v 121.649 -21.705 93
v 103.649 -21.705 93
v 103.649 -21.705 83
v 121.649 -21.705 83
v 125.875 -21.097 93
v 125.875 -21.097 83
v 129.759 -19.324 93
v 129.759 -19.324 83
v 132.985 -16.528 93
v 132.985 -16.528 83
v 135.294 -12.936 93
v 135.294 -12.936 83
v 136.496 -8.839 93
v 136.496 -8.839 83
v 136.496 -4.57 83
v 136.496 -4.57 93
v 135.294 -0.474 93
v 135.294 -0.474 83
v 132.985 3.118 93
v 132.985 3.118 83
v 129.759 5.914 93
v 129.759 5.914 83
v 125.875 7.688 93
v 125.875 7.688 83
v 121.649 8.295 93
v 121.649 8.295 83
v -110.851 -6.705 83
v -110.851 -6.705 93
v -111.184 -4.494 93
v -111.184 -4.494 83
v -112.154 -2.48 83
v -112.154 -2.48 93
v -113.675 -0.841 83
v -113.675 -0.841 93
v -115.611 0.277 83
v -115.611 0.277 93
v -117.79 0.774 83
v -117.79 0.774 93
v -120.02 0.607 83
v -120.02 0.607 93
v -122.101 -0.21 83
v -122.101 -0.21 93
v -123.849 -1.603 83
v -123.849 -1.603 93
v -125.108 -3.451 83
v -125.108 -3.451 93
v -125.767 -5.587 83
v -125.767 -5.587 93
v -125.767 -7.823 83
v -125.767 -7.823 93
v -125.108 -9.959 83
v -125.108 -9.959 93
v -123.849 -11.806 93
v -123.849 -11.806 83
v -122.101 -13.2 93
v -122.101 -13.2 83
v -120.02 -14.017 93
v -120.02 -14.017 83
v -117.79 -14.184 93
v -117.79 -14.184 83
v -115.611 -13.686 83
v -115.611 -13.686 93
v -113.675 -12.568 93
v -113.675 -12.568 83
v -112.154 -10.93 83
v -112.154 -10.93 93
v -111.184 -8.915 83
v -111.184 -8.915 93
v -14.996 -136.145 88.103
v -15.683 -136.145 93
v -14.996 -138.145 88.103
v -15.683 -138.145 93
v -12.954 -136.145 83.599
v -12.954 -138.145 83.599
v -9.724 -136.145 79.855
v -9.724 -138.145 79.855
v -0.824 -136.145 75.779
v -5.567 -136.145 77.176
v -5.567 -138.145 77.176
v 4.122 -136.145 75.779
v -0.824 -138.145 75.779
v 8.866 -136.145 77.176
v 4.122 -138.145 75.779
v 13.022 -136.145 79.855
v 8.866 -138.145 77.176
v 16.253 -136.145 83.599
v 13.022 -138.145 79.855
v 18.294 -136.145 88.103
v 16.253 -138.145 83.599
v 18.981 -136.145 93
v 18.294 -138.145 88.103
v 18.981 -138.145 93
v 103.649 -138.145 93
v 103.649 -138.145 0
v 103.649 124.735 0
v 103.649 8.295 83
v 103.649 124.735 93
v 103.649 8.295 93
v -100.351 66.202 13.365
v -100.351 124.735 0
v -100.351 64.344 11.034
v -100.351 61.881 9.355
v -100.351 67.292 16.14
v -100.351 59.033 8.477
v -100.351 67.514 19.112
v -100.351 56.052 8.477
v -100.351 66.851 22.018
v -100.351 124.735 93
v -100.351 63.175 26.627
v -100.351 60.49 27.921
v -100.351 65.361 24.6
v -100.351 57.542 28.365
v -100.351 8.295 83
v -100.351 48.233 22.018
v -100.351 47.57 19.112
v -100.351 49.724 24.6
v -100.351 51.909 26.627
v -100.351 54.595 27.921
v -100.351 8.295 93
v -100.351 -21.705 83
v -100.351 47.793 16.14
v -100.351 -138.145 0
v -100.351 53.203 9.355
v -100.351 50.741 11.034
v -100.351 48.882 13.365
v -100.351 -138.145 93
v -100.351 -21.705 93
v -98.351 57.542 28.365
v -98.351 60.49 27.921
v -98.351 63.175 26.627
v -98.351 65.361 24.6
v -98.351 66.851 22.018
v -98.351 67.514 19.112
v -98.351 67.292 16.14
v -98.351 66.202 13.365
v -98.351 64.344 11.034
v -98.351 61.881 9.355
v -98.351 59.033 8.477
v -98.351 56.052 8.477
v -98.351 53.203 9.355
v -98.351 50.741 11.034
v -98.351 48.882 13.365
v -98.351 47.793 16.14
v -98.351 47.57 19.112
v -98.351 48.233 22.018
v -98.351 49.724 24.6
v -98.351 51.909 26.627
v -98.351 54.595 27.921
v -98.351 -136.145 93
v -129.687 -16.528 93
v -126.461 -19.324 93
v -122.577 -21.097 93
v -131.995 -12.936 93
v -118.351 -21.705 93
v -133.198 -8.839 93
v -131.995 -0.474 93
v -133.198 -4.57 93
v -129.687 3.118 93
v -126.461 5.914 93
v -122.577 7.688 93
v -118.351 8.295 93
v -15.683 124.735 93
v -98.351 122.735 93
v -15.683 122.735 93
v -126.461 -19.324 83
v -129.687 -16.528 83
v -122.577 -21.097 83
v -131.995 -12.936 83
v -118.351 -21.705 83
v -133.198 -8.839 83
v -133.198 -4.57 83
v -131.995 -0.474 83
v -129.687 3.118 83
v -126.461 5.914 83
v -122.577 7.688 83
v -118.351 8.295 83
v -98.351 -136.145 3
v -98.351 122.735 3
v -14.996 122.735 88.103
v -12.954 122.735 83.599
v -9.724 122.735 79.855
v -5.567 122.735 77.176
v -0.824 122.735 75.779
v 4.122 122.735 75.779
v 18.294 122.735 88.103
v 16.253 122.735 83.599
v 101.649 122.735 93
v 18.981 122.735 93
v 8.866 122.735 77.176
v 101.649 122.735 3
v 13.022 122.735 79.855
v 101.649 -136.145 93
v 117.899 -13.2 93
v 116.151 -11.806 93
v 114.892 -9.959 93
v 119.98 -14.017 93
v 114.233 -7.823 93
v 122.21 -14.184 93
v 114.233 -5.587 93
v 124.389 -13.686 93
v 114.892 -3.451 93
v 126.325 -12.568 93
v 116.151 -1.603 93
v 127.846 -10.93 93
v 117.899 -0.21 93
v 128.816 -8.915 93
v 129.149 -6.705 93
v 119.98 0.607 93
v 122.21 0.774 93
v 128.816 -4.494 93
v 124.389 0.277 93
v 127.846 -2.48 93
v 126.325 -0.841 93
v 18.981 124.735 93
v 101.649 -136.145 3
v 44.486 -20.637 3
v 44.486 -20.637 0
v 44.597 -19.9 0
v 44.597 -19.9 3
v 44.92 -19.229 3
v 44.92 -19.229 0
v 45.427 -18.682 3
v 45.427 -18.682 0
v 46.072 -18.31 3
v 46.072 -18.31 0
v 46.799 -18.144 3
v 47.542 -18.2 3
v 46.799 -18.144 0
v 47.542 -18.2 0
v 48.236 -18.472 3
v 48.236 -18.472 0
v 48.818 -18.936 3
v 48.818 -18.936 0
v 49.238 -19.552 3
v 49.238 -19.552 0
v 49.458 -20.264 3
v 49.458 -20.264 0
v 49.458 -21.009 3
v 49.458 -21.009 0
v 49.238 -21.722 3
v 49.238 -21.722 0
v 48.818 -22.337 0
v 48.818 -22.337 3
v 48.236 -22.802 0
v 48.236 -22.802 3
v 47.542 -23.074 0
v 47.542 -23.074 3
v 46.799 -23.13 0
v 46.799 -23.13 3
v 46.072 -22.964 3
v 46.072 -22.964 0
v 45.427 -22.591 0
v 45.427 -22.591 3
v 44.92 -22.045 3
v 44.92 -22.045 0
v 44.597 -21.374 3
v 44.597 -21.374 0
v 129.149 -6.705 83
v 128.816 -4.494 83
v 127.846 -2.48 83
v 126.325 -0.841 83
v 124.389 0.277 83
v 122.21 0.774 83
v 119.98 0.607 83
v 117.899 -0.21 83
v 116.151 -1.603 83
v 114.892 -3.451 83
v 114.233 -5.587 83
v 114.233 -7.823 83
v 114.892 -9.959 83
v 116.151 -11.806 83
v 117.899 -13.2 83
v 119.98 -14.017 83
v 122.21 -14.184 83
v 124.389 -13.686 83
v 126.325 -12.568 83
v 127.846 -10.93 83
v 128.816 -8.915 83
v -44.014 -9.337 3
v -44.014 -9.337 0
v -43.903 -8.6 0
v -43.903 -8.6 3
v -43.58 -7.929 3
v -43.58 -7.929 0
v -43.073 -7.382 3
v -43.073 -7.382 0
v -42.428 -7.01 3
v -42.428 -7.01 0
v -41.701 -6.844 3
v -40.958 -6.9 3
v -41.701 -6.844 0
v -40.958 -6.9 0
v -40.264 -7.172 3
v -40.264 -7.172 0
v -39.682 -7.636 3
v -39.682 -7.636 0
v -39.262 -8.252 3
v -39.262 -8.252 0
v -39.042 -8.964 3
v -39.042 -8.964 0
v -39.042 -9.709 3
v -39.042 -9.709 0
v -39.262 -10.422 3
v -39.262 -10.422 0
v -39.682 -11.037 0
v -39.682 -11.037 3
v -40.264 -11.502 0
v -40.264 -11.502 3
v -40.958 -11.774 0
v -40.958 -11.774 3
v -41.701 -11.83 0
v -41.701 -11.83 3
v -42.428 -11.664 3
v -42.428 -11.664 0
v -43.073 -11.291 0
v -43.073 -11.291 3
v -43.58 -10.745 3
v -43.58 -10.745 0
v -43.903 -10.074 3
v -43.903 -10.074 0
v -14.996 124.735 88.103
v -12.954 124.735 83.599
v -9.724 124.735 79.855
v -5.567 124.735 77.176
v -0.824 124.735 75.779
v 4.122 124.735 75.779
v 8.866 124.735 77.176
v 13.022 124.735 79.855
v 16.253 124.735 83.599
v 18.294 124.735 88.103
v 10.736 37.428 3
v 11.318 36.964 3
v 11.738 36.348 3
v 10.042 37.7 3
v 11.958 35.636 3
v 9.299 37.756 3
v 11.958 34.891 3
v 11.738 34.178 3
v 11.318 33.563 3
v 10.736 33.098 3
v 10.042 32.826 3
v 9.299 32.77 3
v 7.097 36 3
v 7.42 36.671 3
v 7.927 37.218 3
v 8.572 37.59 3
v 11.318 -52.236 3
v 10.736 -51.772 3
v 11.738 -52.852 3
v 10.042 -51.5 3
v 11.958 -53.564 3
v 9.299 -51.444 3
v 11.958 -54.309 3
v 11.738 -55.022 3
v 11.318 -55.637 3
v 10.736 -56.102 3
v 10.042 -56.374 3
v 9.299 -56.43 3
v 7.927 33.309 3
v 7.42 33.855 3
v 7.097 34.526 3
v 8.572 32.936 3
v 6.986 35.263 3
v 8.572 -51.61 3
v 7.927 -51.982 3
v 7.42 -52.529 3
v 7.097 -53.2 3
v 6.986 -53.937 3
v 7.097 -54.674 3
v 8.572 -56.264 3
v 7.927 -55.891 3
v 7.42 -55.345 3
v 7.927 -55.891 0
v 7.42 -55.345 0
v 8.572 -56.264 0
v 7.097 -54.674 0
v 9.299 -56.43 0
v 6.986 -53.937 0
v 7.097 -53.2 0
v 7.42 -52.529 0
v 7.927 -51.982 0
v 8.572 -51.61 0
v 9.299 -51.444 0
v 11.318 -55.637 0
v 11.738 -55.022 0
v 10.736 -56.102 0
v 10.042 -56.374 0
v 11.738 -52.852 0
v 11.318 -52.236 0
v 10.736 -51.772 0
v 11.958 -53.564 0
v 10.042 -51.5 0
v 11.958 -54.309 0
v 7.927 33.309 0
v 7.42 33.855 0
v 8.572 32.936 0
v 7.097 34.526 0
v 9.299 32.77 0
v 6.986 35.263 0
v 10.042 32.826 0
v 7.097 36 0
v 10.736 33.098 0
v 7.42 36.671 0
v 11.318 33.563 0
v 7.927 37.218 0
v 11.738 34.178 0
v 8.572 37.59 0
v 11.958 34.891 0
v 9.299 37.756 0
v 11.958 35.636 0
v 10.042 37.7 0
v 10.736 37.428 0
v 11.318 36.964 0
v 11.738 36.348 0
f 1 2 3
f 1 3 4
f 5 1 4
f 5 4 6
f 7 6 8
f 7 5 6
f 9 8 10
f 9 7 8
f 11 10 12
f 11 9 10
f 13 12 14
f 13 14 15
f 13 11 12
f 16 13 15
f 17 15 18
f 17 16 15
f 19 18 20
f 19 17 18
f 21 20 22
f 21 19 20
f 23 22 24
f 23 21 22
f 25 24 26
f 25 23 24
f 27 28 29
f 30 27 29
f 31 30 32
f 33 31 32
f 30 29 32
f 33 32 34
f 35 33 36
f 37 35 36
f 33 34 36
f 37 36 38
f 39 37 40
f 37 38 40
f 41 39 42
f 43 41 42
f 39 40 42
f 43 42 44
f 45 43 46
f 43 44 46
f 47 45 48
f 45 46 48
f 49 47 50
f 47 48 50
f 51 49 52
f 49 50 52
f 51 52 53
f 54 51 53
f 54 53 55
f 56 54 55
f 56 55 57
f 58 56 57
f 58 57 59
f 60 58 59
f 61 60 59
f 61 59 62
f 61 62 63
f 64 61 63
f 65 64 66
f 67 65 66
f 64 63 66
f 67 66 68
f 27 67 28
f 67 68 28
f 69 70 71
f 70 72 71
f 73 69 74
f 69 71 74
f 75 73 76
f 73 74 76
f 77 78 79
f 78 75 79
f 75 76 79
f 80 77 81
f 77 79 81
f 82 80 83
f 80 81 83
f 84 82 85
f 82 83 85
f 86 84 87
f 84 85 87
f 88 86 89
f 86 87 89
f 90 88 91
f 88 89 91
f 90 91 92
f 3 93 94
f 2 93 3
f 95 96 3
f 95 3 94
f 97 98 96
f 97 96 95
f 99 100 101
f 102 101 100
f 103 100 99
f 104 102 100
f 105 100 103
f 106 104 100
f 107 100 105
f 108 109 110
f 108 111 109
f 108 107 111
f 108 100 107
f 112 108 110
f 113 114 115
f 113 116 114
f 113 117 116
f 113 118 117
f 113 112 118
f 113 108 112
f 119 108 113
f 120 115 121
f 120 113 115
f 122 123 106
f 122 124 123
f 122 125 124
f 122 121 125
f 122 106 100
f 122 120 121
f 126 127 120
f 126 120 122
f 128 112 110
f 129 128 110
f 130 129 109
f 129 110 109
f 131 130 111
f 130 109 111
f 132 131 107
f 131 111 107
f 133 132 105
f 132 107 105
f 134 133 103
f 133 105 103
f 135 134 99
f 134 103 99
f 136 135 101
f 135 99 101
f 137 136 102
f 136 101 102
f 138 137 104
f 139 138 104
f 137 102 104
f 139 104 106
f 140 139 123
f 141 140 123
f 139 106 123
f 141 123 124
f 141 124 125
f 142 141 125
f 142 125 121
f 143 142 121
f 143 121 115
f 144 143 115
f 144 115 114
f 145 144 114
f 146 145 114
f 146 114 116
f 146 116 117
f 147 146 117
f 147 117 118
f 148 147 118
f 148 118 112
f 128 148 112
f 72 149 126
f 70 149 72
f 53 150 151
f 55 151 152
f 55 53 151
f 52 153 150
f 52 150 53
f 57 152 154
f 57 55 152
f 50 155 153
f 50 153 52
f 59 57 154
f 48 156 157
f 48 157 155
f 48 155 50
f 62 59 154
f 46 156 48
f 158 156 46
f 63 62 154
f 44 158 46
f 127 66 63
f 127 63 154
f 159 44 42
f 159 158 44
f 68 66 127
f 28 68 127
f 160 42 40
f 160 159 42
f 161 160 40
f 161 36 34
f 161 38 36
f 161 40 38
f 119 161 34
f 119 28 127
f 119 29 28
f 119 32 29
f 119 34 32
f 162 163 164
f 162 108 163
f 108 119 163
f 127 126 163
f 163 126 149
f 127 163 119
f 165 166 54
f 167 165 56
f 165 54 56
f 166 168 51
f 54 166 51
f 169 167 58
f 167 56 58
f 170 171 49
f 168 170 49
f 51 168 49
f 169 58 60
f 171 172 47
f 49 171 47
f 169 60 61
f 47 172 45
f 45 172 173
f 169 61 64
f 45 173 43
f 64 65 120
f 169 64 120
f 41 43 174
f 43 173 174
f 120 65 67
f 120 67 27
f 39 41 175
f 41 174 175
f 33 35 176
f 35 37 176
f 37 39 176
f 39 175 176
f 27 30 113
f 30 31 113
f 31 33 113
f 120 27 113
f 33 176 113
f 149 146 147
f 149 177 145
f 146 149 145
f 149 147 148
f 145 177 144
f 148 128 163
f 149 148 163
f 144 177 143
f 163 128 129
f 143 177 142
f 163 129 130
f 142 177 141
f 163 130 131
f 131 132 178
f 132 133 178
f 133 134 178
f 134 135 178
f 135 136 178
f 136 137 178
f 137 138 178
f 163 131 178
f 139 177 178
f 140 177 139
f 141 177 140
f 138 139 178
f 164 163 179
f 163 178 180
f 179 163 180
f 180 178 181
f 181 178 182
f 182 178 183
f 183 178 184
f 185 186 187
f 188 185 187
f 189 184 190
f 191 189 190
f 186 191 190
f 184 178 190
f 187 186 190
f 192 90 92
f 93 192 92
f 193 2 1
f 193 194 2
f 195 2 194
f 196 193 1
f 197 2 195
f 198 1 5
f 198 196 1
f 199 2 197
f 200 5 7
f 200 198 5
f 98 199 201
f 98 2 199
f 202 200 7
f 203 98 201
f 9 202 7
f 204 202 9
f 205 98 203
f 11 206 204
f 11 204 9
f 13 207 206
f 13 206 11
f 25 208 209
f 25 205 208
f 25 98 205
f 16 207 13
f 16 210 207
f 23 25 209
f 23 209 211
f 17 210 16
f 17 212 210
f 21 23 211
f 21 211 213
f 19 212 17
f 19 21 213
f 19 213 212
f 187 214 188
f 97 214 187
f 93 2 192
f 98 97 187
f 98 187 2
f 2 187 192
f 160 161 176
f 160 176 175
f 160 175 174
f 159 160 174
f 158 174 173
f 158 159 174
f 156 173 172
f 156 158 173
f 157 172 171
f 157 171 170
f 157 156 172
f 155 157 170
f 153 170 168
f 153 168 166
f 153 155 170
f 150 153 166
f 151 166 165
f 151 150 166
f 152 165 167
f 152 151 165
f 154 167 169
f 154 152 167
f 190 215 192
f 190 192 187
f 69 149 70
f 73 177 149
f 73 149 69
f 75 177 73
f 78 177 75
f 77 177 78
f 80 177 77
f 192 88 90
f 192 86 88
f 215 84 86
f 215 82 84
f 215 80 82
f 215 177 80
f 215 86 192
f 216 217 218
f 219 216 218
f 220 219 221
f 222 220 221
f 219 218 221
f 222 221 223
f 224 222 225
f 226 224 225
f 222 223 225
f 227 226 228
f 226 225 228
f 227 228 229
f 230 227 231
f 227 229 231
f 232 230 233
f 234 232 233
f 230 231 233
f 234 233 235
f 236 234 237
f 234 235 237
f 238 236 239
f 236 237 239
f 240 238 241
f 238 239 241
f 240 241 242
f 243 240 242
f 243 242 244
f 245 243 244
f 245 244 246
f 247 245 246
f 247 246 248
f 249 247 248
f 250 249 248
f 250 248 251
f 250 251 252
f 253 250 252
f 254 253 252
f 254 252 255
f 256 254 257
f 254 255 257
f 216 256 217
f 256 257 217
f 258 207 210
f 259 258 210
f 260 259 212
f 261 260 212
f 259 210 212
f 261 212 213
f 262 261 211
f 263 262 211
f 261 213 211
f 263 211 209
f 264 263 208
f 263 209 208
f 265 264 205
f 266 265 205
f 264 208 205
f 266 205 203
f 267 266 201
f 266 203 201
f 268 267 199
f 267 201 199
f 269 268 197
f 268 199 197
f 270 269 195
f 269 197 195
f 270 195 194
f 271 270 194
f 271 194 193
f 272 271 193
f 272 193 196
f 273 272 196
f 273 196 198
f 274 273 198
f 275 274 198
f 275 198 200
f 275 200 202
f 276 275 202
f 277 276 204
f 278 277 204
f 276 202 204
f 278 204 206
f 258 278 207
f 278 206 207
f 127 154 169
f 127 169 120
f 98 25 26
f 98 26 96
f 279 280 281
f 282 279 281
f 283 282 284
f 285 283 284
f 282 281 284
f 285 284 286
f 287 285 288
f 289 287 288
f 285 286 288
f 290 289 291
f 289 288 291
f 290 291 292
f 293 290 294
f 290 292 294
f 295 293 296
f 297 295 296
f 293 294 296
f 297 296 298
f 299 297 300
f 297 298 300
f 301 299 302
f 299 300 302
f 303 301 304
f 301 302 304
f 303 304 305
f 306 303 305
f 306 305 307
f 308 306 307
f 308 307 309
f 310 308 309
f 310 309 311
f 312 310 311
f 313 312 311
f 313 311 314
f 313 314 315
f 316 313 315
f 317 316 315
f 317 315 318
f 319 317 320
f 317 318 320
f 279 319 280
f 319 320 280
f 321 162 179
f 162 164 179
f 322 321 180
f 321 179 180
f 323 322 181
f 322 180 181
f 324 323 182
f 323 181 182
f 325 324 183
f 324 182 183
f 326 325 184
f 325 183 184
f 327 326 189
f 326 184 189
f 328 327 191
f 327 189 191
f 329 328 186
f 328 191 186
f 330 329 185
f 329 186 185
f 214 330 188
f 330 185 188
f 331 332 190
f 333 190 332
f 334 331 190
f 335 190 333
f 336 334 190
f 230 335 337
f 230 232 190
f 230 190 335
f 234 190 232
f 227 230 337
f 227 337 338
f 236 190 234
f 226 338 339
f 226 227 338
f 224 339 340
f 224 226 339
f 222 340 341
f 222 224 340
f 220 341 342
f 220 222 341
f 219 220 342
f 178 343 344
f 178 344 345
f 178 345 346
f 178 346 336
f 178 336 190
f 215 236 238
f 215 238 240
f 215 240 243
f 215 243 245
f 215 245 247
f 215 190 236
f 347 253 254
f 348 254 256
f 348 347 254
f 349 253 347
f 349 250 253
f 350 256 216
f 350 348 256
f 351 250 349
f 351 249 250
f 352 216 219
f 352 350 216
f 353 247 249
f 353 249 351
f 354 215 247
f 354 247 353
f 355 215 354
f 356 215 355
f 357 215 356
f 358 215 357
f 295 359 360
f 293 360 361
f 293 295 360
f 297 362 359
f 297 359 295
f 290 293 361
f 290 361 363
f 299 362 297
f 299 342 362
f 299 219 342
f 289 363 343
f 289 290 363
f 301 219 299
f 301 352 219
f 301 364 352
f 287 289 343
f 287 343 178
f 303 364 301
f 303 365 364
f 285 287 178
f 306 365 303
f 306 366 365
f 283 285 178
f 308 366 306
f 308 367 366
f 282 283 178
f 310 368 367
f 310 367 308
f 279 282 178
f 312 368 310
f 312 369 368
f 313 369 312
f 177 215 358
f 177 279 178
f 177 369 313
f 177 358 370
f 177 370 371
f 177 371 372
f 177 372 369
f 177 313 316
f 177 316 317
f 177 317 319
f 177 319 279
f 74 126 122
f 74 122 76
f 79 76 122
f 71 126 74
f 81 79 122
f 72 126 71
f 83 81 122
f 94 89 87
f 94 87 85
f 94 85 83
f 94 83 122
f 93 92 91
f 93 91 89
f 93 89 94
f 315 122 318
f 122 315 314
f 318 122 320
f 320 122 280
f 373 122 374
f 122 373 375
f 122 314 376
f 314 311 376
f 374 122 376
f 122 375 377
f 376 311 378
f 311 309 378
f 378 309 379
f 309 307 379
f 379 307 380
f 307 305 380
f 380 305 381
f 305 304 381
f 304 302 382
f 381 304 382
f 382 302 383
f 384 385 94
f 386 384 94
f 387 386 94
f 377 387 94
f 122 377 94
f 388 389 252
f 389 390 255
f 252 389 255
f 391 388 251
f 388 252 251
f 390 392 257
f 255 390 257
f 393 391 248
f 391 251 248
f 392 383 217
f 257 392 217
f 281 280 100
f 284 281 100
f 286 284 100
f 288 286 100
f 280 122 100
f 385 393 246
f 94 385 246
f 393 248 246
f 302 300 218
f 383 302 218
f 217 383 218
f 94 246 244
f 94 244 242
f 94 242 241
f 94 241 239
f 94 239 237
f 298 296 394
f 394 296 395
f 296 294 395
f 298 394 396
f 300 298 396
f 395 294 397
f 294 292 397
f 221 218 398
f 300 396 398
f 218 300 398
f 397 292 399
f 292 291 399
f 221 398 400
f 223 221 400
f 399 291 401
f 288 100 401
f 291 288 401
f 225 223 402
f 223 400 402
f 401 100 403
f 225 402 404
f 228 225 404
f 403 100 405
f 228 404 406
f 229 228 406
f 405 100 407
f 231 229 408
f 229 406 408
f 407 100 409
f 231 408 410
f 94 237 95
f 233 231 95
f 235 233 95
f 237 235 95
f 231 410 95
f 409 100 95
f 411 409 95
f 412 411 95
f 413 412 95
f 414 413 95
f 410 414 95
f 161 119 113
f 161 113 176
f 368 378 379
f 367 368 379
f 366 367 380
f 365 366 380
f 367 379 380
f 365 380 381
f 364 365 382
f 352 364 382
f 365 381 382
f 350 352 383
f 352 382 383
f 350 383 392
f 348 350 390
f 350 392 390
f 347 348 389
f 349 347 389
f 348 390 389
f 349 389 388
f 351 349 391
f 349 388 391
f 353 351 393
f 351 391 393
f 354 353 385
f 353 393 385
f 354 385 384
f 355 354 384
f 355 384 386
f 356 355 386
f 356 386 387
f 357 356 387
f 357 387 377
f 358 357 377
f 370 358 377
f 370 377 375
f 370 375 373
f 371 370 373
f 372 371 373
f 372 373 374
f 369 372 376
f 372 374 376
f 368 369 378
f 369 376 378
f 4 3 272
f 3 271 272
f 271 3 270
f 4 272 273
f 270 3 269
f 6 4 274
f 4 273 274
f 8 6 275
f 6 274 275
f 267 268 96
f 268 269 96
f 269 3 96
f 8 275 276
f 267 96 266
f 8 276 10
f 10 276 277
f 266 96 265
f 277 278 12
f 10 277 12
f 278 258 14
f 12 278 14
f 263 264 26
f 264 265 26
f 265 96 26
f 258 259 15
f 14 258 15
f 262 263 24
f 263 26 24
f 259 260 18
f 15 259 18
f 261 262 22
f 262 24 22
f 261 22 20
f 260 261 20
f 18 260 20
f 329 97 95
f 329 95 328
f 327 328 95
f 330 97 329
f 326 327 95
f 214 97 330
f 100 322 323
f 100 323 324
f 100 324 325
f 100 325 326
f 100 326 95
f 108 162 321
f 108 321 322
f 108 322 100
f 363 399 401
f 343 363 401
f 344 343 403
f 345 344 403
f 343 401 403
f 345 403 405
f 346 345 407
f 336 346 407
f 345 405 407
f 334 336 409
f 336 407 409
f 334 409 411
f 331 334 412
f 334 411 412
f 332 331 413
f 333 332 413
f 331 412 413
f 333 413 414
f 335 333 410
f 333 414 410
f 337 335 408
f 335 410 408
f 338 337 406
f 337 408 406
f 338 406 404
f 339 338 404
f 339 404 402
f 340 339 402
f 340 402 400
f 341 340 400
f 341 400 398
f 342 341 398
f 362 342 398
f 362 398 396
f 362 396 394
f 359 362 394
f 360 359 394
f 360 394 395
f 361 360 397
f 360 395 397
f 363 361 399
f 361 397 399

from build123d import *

# Parameters (mm, degrees)
SKETCH1_W                = 200
SKETCH1_H                = 258.87959476
BOSS_EXTRUDE1_DEPTH      = 3
SKETCH2_W                = 200
SKETCH2_H                = 258.87959476
BOSS_EXTRUDE3_DEPTH      = 90
BOSS_EXTRUDE3_DEPTH_BACK = 3
SKETCH3_R                = 2.5
CUT_EXTRUDE2_DEPTH       = 3
SKETCH4_R                = 17.332315934
CUT_EXTRUDE4_DEPTH       = 263.87959476
SKETCH5_R                = 7.5
BOSS_EXTRUDE5_DEPTH      = 10
CUT_EXTRUDE5_REACH       = 239
SKETCH6_R                = 10


with BuildPart() as part:
    # Sketch1 → Boss-Extrude1 (new body)
    with BuildSketch(Plane(origin=(0, 0, 0), x_dir=(-1, 0, 0), z_dir=(0, 0, 1))):
        with Locations((-1.649083583, 6.704740248)):
            Rectangle(SKETCH1_W, SKETCH1_H)
    extrude(amount=BOSS_EXTRUDE1_DEPTH)

    # Sketch2 → Boss-Extrude3 (add, two sides)
    with BuildSketch(Plane.XY.offset(3)) as boss_extrude3_sk:
        Polygon((-100.350916417, 122.735057132), (-100.350916417, -138.144537628), (103.649083583, -138.144537628), (103.649083583, 124.735057132), (-100.350916417, 124.735057132), align=None)
        with Locations((1.649083583, -6.704740248)):
            Rectangle(SKETCH2_W, SKETCH2_H, mode=Mode.SUBTRACT)
    extrude(amount=BOSS_EXTRUDE3_DEPTH)
    extrude(boss_extrude3_sk.sketch, amount=-BOSS_EXTRUDE3_DEPTH_BACK)

    # Sketch3 → Cut-Extrude2 (cut)
    with BuildSketch(Plane(origin=(0, 0, 0), x_dir=(-1, 0, 0), z_dir=(0, 0, -1))):
        with Locations((41.514444489, -9.336870594)):
            Circle(SKETCH3_R)
        with Locations((-9.485555511, 35.263129406)):
            Circle(SKETCH3_R)
        with Locations((-9.485555511, -53.936870594)):
            Circle(SKETCH3_R)
        with Locations((-46.985555511, -20.636870594)):
            Circle(SKETCH3_R)
    extrude(amount=-CUT_EXTRUDE2_DEPTH, mode=Mode.SUBTRACT)

    # Sketch4 → Cut-Extrude4 (cut, through all)
    with BuildSketch(Plane.XZ.offset(138.144537628)):
        with Locations((1.649062898, 92.934091246)):
            Circle(SKETCH4_R)
    extrude(amount=-CUT_EXTRUDE4_DEPTH, mode=Mode.SUBTRACT)

    # Sketch5 → Boss-Extrude5 (add)
    with BuildSketch(Plane.XY.offset(93)):
        with BuildLine():
            Line((103.649083583, 8.295259752), (103.649083583, -6.704740248))
            Line((103.649083583, -6.704740248), (103.649083583, -21.704740248))
            Line((103.649083583, -21.704740248), (121.649083583, -21.704740248))
            ThreePointArc((121.649083583, -21.704740248), (136.649083583, -6.704740248), (121.649083583, 8.295259752))
            Line((121.649083583, 8.295259752), (103.649083583, 8.295259752))
        make_face()
        with Locations((121.649083583, -6.704740248)):
            Circle(SKETCH5_R, mode=Mode.SUBTRACT)
        with BuildLine():
            Line((-100.350916417, -21.704740248), (-100.350916417, -6.704740248))
            Line((-100.350916417, -6.704740248), (-100.350916417, 8.295259752))
            Line((-100.350916417, 8.295259752), (-118.350916417, 8.295259752))
            ThreePointArc((-118.350916417, 8.295259752), (-133.350916417, -6.704740248), (-118.350916417, -21.704740248))
            Line((-118.350916417, -21.704740248), (-100.350916417, -21.704740248))
        make_face()
        with Locations((-118.350916417, -6.704740248)):
            Circle(SKETCH5_R, mode=Mode.SUBTRACT)
    extrude(amount=-BOSS_EXTRUDE5_DEPTH)

    # Sketch6 → Cut-Extrude5 (cut, up to next)
    with BuildSketch(Plane.ZY.offset(100.350916417), mode=Mode.PRIVATE) as cut_extrude5_sk1:
        with Locations((18.364873633, 57.542228563)):
            Circle(SKETCH6_R)
    cut_extrude5_tool1 = extrude(cut_extrude5_sk1.sketch, amount=-CUT_EXTRUDE5_REACH, mode=Mode.PRIVATE) & part.part
    add(cut_extrude5_tool1.solids().sort_by_distance((-100.350916, 57.542229, 18.364874))[0], mode=Mode.SUBTRACT)


solid = part.part
